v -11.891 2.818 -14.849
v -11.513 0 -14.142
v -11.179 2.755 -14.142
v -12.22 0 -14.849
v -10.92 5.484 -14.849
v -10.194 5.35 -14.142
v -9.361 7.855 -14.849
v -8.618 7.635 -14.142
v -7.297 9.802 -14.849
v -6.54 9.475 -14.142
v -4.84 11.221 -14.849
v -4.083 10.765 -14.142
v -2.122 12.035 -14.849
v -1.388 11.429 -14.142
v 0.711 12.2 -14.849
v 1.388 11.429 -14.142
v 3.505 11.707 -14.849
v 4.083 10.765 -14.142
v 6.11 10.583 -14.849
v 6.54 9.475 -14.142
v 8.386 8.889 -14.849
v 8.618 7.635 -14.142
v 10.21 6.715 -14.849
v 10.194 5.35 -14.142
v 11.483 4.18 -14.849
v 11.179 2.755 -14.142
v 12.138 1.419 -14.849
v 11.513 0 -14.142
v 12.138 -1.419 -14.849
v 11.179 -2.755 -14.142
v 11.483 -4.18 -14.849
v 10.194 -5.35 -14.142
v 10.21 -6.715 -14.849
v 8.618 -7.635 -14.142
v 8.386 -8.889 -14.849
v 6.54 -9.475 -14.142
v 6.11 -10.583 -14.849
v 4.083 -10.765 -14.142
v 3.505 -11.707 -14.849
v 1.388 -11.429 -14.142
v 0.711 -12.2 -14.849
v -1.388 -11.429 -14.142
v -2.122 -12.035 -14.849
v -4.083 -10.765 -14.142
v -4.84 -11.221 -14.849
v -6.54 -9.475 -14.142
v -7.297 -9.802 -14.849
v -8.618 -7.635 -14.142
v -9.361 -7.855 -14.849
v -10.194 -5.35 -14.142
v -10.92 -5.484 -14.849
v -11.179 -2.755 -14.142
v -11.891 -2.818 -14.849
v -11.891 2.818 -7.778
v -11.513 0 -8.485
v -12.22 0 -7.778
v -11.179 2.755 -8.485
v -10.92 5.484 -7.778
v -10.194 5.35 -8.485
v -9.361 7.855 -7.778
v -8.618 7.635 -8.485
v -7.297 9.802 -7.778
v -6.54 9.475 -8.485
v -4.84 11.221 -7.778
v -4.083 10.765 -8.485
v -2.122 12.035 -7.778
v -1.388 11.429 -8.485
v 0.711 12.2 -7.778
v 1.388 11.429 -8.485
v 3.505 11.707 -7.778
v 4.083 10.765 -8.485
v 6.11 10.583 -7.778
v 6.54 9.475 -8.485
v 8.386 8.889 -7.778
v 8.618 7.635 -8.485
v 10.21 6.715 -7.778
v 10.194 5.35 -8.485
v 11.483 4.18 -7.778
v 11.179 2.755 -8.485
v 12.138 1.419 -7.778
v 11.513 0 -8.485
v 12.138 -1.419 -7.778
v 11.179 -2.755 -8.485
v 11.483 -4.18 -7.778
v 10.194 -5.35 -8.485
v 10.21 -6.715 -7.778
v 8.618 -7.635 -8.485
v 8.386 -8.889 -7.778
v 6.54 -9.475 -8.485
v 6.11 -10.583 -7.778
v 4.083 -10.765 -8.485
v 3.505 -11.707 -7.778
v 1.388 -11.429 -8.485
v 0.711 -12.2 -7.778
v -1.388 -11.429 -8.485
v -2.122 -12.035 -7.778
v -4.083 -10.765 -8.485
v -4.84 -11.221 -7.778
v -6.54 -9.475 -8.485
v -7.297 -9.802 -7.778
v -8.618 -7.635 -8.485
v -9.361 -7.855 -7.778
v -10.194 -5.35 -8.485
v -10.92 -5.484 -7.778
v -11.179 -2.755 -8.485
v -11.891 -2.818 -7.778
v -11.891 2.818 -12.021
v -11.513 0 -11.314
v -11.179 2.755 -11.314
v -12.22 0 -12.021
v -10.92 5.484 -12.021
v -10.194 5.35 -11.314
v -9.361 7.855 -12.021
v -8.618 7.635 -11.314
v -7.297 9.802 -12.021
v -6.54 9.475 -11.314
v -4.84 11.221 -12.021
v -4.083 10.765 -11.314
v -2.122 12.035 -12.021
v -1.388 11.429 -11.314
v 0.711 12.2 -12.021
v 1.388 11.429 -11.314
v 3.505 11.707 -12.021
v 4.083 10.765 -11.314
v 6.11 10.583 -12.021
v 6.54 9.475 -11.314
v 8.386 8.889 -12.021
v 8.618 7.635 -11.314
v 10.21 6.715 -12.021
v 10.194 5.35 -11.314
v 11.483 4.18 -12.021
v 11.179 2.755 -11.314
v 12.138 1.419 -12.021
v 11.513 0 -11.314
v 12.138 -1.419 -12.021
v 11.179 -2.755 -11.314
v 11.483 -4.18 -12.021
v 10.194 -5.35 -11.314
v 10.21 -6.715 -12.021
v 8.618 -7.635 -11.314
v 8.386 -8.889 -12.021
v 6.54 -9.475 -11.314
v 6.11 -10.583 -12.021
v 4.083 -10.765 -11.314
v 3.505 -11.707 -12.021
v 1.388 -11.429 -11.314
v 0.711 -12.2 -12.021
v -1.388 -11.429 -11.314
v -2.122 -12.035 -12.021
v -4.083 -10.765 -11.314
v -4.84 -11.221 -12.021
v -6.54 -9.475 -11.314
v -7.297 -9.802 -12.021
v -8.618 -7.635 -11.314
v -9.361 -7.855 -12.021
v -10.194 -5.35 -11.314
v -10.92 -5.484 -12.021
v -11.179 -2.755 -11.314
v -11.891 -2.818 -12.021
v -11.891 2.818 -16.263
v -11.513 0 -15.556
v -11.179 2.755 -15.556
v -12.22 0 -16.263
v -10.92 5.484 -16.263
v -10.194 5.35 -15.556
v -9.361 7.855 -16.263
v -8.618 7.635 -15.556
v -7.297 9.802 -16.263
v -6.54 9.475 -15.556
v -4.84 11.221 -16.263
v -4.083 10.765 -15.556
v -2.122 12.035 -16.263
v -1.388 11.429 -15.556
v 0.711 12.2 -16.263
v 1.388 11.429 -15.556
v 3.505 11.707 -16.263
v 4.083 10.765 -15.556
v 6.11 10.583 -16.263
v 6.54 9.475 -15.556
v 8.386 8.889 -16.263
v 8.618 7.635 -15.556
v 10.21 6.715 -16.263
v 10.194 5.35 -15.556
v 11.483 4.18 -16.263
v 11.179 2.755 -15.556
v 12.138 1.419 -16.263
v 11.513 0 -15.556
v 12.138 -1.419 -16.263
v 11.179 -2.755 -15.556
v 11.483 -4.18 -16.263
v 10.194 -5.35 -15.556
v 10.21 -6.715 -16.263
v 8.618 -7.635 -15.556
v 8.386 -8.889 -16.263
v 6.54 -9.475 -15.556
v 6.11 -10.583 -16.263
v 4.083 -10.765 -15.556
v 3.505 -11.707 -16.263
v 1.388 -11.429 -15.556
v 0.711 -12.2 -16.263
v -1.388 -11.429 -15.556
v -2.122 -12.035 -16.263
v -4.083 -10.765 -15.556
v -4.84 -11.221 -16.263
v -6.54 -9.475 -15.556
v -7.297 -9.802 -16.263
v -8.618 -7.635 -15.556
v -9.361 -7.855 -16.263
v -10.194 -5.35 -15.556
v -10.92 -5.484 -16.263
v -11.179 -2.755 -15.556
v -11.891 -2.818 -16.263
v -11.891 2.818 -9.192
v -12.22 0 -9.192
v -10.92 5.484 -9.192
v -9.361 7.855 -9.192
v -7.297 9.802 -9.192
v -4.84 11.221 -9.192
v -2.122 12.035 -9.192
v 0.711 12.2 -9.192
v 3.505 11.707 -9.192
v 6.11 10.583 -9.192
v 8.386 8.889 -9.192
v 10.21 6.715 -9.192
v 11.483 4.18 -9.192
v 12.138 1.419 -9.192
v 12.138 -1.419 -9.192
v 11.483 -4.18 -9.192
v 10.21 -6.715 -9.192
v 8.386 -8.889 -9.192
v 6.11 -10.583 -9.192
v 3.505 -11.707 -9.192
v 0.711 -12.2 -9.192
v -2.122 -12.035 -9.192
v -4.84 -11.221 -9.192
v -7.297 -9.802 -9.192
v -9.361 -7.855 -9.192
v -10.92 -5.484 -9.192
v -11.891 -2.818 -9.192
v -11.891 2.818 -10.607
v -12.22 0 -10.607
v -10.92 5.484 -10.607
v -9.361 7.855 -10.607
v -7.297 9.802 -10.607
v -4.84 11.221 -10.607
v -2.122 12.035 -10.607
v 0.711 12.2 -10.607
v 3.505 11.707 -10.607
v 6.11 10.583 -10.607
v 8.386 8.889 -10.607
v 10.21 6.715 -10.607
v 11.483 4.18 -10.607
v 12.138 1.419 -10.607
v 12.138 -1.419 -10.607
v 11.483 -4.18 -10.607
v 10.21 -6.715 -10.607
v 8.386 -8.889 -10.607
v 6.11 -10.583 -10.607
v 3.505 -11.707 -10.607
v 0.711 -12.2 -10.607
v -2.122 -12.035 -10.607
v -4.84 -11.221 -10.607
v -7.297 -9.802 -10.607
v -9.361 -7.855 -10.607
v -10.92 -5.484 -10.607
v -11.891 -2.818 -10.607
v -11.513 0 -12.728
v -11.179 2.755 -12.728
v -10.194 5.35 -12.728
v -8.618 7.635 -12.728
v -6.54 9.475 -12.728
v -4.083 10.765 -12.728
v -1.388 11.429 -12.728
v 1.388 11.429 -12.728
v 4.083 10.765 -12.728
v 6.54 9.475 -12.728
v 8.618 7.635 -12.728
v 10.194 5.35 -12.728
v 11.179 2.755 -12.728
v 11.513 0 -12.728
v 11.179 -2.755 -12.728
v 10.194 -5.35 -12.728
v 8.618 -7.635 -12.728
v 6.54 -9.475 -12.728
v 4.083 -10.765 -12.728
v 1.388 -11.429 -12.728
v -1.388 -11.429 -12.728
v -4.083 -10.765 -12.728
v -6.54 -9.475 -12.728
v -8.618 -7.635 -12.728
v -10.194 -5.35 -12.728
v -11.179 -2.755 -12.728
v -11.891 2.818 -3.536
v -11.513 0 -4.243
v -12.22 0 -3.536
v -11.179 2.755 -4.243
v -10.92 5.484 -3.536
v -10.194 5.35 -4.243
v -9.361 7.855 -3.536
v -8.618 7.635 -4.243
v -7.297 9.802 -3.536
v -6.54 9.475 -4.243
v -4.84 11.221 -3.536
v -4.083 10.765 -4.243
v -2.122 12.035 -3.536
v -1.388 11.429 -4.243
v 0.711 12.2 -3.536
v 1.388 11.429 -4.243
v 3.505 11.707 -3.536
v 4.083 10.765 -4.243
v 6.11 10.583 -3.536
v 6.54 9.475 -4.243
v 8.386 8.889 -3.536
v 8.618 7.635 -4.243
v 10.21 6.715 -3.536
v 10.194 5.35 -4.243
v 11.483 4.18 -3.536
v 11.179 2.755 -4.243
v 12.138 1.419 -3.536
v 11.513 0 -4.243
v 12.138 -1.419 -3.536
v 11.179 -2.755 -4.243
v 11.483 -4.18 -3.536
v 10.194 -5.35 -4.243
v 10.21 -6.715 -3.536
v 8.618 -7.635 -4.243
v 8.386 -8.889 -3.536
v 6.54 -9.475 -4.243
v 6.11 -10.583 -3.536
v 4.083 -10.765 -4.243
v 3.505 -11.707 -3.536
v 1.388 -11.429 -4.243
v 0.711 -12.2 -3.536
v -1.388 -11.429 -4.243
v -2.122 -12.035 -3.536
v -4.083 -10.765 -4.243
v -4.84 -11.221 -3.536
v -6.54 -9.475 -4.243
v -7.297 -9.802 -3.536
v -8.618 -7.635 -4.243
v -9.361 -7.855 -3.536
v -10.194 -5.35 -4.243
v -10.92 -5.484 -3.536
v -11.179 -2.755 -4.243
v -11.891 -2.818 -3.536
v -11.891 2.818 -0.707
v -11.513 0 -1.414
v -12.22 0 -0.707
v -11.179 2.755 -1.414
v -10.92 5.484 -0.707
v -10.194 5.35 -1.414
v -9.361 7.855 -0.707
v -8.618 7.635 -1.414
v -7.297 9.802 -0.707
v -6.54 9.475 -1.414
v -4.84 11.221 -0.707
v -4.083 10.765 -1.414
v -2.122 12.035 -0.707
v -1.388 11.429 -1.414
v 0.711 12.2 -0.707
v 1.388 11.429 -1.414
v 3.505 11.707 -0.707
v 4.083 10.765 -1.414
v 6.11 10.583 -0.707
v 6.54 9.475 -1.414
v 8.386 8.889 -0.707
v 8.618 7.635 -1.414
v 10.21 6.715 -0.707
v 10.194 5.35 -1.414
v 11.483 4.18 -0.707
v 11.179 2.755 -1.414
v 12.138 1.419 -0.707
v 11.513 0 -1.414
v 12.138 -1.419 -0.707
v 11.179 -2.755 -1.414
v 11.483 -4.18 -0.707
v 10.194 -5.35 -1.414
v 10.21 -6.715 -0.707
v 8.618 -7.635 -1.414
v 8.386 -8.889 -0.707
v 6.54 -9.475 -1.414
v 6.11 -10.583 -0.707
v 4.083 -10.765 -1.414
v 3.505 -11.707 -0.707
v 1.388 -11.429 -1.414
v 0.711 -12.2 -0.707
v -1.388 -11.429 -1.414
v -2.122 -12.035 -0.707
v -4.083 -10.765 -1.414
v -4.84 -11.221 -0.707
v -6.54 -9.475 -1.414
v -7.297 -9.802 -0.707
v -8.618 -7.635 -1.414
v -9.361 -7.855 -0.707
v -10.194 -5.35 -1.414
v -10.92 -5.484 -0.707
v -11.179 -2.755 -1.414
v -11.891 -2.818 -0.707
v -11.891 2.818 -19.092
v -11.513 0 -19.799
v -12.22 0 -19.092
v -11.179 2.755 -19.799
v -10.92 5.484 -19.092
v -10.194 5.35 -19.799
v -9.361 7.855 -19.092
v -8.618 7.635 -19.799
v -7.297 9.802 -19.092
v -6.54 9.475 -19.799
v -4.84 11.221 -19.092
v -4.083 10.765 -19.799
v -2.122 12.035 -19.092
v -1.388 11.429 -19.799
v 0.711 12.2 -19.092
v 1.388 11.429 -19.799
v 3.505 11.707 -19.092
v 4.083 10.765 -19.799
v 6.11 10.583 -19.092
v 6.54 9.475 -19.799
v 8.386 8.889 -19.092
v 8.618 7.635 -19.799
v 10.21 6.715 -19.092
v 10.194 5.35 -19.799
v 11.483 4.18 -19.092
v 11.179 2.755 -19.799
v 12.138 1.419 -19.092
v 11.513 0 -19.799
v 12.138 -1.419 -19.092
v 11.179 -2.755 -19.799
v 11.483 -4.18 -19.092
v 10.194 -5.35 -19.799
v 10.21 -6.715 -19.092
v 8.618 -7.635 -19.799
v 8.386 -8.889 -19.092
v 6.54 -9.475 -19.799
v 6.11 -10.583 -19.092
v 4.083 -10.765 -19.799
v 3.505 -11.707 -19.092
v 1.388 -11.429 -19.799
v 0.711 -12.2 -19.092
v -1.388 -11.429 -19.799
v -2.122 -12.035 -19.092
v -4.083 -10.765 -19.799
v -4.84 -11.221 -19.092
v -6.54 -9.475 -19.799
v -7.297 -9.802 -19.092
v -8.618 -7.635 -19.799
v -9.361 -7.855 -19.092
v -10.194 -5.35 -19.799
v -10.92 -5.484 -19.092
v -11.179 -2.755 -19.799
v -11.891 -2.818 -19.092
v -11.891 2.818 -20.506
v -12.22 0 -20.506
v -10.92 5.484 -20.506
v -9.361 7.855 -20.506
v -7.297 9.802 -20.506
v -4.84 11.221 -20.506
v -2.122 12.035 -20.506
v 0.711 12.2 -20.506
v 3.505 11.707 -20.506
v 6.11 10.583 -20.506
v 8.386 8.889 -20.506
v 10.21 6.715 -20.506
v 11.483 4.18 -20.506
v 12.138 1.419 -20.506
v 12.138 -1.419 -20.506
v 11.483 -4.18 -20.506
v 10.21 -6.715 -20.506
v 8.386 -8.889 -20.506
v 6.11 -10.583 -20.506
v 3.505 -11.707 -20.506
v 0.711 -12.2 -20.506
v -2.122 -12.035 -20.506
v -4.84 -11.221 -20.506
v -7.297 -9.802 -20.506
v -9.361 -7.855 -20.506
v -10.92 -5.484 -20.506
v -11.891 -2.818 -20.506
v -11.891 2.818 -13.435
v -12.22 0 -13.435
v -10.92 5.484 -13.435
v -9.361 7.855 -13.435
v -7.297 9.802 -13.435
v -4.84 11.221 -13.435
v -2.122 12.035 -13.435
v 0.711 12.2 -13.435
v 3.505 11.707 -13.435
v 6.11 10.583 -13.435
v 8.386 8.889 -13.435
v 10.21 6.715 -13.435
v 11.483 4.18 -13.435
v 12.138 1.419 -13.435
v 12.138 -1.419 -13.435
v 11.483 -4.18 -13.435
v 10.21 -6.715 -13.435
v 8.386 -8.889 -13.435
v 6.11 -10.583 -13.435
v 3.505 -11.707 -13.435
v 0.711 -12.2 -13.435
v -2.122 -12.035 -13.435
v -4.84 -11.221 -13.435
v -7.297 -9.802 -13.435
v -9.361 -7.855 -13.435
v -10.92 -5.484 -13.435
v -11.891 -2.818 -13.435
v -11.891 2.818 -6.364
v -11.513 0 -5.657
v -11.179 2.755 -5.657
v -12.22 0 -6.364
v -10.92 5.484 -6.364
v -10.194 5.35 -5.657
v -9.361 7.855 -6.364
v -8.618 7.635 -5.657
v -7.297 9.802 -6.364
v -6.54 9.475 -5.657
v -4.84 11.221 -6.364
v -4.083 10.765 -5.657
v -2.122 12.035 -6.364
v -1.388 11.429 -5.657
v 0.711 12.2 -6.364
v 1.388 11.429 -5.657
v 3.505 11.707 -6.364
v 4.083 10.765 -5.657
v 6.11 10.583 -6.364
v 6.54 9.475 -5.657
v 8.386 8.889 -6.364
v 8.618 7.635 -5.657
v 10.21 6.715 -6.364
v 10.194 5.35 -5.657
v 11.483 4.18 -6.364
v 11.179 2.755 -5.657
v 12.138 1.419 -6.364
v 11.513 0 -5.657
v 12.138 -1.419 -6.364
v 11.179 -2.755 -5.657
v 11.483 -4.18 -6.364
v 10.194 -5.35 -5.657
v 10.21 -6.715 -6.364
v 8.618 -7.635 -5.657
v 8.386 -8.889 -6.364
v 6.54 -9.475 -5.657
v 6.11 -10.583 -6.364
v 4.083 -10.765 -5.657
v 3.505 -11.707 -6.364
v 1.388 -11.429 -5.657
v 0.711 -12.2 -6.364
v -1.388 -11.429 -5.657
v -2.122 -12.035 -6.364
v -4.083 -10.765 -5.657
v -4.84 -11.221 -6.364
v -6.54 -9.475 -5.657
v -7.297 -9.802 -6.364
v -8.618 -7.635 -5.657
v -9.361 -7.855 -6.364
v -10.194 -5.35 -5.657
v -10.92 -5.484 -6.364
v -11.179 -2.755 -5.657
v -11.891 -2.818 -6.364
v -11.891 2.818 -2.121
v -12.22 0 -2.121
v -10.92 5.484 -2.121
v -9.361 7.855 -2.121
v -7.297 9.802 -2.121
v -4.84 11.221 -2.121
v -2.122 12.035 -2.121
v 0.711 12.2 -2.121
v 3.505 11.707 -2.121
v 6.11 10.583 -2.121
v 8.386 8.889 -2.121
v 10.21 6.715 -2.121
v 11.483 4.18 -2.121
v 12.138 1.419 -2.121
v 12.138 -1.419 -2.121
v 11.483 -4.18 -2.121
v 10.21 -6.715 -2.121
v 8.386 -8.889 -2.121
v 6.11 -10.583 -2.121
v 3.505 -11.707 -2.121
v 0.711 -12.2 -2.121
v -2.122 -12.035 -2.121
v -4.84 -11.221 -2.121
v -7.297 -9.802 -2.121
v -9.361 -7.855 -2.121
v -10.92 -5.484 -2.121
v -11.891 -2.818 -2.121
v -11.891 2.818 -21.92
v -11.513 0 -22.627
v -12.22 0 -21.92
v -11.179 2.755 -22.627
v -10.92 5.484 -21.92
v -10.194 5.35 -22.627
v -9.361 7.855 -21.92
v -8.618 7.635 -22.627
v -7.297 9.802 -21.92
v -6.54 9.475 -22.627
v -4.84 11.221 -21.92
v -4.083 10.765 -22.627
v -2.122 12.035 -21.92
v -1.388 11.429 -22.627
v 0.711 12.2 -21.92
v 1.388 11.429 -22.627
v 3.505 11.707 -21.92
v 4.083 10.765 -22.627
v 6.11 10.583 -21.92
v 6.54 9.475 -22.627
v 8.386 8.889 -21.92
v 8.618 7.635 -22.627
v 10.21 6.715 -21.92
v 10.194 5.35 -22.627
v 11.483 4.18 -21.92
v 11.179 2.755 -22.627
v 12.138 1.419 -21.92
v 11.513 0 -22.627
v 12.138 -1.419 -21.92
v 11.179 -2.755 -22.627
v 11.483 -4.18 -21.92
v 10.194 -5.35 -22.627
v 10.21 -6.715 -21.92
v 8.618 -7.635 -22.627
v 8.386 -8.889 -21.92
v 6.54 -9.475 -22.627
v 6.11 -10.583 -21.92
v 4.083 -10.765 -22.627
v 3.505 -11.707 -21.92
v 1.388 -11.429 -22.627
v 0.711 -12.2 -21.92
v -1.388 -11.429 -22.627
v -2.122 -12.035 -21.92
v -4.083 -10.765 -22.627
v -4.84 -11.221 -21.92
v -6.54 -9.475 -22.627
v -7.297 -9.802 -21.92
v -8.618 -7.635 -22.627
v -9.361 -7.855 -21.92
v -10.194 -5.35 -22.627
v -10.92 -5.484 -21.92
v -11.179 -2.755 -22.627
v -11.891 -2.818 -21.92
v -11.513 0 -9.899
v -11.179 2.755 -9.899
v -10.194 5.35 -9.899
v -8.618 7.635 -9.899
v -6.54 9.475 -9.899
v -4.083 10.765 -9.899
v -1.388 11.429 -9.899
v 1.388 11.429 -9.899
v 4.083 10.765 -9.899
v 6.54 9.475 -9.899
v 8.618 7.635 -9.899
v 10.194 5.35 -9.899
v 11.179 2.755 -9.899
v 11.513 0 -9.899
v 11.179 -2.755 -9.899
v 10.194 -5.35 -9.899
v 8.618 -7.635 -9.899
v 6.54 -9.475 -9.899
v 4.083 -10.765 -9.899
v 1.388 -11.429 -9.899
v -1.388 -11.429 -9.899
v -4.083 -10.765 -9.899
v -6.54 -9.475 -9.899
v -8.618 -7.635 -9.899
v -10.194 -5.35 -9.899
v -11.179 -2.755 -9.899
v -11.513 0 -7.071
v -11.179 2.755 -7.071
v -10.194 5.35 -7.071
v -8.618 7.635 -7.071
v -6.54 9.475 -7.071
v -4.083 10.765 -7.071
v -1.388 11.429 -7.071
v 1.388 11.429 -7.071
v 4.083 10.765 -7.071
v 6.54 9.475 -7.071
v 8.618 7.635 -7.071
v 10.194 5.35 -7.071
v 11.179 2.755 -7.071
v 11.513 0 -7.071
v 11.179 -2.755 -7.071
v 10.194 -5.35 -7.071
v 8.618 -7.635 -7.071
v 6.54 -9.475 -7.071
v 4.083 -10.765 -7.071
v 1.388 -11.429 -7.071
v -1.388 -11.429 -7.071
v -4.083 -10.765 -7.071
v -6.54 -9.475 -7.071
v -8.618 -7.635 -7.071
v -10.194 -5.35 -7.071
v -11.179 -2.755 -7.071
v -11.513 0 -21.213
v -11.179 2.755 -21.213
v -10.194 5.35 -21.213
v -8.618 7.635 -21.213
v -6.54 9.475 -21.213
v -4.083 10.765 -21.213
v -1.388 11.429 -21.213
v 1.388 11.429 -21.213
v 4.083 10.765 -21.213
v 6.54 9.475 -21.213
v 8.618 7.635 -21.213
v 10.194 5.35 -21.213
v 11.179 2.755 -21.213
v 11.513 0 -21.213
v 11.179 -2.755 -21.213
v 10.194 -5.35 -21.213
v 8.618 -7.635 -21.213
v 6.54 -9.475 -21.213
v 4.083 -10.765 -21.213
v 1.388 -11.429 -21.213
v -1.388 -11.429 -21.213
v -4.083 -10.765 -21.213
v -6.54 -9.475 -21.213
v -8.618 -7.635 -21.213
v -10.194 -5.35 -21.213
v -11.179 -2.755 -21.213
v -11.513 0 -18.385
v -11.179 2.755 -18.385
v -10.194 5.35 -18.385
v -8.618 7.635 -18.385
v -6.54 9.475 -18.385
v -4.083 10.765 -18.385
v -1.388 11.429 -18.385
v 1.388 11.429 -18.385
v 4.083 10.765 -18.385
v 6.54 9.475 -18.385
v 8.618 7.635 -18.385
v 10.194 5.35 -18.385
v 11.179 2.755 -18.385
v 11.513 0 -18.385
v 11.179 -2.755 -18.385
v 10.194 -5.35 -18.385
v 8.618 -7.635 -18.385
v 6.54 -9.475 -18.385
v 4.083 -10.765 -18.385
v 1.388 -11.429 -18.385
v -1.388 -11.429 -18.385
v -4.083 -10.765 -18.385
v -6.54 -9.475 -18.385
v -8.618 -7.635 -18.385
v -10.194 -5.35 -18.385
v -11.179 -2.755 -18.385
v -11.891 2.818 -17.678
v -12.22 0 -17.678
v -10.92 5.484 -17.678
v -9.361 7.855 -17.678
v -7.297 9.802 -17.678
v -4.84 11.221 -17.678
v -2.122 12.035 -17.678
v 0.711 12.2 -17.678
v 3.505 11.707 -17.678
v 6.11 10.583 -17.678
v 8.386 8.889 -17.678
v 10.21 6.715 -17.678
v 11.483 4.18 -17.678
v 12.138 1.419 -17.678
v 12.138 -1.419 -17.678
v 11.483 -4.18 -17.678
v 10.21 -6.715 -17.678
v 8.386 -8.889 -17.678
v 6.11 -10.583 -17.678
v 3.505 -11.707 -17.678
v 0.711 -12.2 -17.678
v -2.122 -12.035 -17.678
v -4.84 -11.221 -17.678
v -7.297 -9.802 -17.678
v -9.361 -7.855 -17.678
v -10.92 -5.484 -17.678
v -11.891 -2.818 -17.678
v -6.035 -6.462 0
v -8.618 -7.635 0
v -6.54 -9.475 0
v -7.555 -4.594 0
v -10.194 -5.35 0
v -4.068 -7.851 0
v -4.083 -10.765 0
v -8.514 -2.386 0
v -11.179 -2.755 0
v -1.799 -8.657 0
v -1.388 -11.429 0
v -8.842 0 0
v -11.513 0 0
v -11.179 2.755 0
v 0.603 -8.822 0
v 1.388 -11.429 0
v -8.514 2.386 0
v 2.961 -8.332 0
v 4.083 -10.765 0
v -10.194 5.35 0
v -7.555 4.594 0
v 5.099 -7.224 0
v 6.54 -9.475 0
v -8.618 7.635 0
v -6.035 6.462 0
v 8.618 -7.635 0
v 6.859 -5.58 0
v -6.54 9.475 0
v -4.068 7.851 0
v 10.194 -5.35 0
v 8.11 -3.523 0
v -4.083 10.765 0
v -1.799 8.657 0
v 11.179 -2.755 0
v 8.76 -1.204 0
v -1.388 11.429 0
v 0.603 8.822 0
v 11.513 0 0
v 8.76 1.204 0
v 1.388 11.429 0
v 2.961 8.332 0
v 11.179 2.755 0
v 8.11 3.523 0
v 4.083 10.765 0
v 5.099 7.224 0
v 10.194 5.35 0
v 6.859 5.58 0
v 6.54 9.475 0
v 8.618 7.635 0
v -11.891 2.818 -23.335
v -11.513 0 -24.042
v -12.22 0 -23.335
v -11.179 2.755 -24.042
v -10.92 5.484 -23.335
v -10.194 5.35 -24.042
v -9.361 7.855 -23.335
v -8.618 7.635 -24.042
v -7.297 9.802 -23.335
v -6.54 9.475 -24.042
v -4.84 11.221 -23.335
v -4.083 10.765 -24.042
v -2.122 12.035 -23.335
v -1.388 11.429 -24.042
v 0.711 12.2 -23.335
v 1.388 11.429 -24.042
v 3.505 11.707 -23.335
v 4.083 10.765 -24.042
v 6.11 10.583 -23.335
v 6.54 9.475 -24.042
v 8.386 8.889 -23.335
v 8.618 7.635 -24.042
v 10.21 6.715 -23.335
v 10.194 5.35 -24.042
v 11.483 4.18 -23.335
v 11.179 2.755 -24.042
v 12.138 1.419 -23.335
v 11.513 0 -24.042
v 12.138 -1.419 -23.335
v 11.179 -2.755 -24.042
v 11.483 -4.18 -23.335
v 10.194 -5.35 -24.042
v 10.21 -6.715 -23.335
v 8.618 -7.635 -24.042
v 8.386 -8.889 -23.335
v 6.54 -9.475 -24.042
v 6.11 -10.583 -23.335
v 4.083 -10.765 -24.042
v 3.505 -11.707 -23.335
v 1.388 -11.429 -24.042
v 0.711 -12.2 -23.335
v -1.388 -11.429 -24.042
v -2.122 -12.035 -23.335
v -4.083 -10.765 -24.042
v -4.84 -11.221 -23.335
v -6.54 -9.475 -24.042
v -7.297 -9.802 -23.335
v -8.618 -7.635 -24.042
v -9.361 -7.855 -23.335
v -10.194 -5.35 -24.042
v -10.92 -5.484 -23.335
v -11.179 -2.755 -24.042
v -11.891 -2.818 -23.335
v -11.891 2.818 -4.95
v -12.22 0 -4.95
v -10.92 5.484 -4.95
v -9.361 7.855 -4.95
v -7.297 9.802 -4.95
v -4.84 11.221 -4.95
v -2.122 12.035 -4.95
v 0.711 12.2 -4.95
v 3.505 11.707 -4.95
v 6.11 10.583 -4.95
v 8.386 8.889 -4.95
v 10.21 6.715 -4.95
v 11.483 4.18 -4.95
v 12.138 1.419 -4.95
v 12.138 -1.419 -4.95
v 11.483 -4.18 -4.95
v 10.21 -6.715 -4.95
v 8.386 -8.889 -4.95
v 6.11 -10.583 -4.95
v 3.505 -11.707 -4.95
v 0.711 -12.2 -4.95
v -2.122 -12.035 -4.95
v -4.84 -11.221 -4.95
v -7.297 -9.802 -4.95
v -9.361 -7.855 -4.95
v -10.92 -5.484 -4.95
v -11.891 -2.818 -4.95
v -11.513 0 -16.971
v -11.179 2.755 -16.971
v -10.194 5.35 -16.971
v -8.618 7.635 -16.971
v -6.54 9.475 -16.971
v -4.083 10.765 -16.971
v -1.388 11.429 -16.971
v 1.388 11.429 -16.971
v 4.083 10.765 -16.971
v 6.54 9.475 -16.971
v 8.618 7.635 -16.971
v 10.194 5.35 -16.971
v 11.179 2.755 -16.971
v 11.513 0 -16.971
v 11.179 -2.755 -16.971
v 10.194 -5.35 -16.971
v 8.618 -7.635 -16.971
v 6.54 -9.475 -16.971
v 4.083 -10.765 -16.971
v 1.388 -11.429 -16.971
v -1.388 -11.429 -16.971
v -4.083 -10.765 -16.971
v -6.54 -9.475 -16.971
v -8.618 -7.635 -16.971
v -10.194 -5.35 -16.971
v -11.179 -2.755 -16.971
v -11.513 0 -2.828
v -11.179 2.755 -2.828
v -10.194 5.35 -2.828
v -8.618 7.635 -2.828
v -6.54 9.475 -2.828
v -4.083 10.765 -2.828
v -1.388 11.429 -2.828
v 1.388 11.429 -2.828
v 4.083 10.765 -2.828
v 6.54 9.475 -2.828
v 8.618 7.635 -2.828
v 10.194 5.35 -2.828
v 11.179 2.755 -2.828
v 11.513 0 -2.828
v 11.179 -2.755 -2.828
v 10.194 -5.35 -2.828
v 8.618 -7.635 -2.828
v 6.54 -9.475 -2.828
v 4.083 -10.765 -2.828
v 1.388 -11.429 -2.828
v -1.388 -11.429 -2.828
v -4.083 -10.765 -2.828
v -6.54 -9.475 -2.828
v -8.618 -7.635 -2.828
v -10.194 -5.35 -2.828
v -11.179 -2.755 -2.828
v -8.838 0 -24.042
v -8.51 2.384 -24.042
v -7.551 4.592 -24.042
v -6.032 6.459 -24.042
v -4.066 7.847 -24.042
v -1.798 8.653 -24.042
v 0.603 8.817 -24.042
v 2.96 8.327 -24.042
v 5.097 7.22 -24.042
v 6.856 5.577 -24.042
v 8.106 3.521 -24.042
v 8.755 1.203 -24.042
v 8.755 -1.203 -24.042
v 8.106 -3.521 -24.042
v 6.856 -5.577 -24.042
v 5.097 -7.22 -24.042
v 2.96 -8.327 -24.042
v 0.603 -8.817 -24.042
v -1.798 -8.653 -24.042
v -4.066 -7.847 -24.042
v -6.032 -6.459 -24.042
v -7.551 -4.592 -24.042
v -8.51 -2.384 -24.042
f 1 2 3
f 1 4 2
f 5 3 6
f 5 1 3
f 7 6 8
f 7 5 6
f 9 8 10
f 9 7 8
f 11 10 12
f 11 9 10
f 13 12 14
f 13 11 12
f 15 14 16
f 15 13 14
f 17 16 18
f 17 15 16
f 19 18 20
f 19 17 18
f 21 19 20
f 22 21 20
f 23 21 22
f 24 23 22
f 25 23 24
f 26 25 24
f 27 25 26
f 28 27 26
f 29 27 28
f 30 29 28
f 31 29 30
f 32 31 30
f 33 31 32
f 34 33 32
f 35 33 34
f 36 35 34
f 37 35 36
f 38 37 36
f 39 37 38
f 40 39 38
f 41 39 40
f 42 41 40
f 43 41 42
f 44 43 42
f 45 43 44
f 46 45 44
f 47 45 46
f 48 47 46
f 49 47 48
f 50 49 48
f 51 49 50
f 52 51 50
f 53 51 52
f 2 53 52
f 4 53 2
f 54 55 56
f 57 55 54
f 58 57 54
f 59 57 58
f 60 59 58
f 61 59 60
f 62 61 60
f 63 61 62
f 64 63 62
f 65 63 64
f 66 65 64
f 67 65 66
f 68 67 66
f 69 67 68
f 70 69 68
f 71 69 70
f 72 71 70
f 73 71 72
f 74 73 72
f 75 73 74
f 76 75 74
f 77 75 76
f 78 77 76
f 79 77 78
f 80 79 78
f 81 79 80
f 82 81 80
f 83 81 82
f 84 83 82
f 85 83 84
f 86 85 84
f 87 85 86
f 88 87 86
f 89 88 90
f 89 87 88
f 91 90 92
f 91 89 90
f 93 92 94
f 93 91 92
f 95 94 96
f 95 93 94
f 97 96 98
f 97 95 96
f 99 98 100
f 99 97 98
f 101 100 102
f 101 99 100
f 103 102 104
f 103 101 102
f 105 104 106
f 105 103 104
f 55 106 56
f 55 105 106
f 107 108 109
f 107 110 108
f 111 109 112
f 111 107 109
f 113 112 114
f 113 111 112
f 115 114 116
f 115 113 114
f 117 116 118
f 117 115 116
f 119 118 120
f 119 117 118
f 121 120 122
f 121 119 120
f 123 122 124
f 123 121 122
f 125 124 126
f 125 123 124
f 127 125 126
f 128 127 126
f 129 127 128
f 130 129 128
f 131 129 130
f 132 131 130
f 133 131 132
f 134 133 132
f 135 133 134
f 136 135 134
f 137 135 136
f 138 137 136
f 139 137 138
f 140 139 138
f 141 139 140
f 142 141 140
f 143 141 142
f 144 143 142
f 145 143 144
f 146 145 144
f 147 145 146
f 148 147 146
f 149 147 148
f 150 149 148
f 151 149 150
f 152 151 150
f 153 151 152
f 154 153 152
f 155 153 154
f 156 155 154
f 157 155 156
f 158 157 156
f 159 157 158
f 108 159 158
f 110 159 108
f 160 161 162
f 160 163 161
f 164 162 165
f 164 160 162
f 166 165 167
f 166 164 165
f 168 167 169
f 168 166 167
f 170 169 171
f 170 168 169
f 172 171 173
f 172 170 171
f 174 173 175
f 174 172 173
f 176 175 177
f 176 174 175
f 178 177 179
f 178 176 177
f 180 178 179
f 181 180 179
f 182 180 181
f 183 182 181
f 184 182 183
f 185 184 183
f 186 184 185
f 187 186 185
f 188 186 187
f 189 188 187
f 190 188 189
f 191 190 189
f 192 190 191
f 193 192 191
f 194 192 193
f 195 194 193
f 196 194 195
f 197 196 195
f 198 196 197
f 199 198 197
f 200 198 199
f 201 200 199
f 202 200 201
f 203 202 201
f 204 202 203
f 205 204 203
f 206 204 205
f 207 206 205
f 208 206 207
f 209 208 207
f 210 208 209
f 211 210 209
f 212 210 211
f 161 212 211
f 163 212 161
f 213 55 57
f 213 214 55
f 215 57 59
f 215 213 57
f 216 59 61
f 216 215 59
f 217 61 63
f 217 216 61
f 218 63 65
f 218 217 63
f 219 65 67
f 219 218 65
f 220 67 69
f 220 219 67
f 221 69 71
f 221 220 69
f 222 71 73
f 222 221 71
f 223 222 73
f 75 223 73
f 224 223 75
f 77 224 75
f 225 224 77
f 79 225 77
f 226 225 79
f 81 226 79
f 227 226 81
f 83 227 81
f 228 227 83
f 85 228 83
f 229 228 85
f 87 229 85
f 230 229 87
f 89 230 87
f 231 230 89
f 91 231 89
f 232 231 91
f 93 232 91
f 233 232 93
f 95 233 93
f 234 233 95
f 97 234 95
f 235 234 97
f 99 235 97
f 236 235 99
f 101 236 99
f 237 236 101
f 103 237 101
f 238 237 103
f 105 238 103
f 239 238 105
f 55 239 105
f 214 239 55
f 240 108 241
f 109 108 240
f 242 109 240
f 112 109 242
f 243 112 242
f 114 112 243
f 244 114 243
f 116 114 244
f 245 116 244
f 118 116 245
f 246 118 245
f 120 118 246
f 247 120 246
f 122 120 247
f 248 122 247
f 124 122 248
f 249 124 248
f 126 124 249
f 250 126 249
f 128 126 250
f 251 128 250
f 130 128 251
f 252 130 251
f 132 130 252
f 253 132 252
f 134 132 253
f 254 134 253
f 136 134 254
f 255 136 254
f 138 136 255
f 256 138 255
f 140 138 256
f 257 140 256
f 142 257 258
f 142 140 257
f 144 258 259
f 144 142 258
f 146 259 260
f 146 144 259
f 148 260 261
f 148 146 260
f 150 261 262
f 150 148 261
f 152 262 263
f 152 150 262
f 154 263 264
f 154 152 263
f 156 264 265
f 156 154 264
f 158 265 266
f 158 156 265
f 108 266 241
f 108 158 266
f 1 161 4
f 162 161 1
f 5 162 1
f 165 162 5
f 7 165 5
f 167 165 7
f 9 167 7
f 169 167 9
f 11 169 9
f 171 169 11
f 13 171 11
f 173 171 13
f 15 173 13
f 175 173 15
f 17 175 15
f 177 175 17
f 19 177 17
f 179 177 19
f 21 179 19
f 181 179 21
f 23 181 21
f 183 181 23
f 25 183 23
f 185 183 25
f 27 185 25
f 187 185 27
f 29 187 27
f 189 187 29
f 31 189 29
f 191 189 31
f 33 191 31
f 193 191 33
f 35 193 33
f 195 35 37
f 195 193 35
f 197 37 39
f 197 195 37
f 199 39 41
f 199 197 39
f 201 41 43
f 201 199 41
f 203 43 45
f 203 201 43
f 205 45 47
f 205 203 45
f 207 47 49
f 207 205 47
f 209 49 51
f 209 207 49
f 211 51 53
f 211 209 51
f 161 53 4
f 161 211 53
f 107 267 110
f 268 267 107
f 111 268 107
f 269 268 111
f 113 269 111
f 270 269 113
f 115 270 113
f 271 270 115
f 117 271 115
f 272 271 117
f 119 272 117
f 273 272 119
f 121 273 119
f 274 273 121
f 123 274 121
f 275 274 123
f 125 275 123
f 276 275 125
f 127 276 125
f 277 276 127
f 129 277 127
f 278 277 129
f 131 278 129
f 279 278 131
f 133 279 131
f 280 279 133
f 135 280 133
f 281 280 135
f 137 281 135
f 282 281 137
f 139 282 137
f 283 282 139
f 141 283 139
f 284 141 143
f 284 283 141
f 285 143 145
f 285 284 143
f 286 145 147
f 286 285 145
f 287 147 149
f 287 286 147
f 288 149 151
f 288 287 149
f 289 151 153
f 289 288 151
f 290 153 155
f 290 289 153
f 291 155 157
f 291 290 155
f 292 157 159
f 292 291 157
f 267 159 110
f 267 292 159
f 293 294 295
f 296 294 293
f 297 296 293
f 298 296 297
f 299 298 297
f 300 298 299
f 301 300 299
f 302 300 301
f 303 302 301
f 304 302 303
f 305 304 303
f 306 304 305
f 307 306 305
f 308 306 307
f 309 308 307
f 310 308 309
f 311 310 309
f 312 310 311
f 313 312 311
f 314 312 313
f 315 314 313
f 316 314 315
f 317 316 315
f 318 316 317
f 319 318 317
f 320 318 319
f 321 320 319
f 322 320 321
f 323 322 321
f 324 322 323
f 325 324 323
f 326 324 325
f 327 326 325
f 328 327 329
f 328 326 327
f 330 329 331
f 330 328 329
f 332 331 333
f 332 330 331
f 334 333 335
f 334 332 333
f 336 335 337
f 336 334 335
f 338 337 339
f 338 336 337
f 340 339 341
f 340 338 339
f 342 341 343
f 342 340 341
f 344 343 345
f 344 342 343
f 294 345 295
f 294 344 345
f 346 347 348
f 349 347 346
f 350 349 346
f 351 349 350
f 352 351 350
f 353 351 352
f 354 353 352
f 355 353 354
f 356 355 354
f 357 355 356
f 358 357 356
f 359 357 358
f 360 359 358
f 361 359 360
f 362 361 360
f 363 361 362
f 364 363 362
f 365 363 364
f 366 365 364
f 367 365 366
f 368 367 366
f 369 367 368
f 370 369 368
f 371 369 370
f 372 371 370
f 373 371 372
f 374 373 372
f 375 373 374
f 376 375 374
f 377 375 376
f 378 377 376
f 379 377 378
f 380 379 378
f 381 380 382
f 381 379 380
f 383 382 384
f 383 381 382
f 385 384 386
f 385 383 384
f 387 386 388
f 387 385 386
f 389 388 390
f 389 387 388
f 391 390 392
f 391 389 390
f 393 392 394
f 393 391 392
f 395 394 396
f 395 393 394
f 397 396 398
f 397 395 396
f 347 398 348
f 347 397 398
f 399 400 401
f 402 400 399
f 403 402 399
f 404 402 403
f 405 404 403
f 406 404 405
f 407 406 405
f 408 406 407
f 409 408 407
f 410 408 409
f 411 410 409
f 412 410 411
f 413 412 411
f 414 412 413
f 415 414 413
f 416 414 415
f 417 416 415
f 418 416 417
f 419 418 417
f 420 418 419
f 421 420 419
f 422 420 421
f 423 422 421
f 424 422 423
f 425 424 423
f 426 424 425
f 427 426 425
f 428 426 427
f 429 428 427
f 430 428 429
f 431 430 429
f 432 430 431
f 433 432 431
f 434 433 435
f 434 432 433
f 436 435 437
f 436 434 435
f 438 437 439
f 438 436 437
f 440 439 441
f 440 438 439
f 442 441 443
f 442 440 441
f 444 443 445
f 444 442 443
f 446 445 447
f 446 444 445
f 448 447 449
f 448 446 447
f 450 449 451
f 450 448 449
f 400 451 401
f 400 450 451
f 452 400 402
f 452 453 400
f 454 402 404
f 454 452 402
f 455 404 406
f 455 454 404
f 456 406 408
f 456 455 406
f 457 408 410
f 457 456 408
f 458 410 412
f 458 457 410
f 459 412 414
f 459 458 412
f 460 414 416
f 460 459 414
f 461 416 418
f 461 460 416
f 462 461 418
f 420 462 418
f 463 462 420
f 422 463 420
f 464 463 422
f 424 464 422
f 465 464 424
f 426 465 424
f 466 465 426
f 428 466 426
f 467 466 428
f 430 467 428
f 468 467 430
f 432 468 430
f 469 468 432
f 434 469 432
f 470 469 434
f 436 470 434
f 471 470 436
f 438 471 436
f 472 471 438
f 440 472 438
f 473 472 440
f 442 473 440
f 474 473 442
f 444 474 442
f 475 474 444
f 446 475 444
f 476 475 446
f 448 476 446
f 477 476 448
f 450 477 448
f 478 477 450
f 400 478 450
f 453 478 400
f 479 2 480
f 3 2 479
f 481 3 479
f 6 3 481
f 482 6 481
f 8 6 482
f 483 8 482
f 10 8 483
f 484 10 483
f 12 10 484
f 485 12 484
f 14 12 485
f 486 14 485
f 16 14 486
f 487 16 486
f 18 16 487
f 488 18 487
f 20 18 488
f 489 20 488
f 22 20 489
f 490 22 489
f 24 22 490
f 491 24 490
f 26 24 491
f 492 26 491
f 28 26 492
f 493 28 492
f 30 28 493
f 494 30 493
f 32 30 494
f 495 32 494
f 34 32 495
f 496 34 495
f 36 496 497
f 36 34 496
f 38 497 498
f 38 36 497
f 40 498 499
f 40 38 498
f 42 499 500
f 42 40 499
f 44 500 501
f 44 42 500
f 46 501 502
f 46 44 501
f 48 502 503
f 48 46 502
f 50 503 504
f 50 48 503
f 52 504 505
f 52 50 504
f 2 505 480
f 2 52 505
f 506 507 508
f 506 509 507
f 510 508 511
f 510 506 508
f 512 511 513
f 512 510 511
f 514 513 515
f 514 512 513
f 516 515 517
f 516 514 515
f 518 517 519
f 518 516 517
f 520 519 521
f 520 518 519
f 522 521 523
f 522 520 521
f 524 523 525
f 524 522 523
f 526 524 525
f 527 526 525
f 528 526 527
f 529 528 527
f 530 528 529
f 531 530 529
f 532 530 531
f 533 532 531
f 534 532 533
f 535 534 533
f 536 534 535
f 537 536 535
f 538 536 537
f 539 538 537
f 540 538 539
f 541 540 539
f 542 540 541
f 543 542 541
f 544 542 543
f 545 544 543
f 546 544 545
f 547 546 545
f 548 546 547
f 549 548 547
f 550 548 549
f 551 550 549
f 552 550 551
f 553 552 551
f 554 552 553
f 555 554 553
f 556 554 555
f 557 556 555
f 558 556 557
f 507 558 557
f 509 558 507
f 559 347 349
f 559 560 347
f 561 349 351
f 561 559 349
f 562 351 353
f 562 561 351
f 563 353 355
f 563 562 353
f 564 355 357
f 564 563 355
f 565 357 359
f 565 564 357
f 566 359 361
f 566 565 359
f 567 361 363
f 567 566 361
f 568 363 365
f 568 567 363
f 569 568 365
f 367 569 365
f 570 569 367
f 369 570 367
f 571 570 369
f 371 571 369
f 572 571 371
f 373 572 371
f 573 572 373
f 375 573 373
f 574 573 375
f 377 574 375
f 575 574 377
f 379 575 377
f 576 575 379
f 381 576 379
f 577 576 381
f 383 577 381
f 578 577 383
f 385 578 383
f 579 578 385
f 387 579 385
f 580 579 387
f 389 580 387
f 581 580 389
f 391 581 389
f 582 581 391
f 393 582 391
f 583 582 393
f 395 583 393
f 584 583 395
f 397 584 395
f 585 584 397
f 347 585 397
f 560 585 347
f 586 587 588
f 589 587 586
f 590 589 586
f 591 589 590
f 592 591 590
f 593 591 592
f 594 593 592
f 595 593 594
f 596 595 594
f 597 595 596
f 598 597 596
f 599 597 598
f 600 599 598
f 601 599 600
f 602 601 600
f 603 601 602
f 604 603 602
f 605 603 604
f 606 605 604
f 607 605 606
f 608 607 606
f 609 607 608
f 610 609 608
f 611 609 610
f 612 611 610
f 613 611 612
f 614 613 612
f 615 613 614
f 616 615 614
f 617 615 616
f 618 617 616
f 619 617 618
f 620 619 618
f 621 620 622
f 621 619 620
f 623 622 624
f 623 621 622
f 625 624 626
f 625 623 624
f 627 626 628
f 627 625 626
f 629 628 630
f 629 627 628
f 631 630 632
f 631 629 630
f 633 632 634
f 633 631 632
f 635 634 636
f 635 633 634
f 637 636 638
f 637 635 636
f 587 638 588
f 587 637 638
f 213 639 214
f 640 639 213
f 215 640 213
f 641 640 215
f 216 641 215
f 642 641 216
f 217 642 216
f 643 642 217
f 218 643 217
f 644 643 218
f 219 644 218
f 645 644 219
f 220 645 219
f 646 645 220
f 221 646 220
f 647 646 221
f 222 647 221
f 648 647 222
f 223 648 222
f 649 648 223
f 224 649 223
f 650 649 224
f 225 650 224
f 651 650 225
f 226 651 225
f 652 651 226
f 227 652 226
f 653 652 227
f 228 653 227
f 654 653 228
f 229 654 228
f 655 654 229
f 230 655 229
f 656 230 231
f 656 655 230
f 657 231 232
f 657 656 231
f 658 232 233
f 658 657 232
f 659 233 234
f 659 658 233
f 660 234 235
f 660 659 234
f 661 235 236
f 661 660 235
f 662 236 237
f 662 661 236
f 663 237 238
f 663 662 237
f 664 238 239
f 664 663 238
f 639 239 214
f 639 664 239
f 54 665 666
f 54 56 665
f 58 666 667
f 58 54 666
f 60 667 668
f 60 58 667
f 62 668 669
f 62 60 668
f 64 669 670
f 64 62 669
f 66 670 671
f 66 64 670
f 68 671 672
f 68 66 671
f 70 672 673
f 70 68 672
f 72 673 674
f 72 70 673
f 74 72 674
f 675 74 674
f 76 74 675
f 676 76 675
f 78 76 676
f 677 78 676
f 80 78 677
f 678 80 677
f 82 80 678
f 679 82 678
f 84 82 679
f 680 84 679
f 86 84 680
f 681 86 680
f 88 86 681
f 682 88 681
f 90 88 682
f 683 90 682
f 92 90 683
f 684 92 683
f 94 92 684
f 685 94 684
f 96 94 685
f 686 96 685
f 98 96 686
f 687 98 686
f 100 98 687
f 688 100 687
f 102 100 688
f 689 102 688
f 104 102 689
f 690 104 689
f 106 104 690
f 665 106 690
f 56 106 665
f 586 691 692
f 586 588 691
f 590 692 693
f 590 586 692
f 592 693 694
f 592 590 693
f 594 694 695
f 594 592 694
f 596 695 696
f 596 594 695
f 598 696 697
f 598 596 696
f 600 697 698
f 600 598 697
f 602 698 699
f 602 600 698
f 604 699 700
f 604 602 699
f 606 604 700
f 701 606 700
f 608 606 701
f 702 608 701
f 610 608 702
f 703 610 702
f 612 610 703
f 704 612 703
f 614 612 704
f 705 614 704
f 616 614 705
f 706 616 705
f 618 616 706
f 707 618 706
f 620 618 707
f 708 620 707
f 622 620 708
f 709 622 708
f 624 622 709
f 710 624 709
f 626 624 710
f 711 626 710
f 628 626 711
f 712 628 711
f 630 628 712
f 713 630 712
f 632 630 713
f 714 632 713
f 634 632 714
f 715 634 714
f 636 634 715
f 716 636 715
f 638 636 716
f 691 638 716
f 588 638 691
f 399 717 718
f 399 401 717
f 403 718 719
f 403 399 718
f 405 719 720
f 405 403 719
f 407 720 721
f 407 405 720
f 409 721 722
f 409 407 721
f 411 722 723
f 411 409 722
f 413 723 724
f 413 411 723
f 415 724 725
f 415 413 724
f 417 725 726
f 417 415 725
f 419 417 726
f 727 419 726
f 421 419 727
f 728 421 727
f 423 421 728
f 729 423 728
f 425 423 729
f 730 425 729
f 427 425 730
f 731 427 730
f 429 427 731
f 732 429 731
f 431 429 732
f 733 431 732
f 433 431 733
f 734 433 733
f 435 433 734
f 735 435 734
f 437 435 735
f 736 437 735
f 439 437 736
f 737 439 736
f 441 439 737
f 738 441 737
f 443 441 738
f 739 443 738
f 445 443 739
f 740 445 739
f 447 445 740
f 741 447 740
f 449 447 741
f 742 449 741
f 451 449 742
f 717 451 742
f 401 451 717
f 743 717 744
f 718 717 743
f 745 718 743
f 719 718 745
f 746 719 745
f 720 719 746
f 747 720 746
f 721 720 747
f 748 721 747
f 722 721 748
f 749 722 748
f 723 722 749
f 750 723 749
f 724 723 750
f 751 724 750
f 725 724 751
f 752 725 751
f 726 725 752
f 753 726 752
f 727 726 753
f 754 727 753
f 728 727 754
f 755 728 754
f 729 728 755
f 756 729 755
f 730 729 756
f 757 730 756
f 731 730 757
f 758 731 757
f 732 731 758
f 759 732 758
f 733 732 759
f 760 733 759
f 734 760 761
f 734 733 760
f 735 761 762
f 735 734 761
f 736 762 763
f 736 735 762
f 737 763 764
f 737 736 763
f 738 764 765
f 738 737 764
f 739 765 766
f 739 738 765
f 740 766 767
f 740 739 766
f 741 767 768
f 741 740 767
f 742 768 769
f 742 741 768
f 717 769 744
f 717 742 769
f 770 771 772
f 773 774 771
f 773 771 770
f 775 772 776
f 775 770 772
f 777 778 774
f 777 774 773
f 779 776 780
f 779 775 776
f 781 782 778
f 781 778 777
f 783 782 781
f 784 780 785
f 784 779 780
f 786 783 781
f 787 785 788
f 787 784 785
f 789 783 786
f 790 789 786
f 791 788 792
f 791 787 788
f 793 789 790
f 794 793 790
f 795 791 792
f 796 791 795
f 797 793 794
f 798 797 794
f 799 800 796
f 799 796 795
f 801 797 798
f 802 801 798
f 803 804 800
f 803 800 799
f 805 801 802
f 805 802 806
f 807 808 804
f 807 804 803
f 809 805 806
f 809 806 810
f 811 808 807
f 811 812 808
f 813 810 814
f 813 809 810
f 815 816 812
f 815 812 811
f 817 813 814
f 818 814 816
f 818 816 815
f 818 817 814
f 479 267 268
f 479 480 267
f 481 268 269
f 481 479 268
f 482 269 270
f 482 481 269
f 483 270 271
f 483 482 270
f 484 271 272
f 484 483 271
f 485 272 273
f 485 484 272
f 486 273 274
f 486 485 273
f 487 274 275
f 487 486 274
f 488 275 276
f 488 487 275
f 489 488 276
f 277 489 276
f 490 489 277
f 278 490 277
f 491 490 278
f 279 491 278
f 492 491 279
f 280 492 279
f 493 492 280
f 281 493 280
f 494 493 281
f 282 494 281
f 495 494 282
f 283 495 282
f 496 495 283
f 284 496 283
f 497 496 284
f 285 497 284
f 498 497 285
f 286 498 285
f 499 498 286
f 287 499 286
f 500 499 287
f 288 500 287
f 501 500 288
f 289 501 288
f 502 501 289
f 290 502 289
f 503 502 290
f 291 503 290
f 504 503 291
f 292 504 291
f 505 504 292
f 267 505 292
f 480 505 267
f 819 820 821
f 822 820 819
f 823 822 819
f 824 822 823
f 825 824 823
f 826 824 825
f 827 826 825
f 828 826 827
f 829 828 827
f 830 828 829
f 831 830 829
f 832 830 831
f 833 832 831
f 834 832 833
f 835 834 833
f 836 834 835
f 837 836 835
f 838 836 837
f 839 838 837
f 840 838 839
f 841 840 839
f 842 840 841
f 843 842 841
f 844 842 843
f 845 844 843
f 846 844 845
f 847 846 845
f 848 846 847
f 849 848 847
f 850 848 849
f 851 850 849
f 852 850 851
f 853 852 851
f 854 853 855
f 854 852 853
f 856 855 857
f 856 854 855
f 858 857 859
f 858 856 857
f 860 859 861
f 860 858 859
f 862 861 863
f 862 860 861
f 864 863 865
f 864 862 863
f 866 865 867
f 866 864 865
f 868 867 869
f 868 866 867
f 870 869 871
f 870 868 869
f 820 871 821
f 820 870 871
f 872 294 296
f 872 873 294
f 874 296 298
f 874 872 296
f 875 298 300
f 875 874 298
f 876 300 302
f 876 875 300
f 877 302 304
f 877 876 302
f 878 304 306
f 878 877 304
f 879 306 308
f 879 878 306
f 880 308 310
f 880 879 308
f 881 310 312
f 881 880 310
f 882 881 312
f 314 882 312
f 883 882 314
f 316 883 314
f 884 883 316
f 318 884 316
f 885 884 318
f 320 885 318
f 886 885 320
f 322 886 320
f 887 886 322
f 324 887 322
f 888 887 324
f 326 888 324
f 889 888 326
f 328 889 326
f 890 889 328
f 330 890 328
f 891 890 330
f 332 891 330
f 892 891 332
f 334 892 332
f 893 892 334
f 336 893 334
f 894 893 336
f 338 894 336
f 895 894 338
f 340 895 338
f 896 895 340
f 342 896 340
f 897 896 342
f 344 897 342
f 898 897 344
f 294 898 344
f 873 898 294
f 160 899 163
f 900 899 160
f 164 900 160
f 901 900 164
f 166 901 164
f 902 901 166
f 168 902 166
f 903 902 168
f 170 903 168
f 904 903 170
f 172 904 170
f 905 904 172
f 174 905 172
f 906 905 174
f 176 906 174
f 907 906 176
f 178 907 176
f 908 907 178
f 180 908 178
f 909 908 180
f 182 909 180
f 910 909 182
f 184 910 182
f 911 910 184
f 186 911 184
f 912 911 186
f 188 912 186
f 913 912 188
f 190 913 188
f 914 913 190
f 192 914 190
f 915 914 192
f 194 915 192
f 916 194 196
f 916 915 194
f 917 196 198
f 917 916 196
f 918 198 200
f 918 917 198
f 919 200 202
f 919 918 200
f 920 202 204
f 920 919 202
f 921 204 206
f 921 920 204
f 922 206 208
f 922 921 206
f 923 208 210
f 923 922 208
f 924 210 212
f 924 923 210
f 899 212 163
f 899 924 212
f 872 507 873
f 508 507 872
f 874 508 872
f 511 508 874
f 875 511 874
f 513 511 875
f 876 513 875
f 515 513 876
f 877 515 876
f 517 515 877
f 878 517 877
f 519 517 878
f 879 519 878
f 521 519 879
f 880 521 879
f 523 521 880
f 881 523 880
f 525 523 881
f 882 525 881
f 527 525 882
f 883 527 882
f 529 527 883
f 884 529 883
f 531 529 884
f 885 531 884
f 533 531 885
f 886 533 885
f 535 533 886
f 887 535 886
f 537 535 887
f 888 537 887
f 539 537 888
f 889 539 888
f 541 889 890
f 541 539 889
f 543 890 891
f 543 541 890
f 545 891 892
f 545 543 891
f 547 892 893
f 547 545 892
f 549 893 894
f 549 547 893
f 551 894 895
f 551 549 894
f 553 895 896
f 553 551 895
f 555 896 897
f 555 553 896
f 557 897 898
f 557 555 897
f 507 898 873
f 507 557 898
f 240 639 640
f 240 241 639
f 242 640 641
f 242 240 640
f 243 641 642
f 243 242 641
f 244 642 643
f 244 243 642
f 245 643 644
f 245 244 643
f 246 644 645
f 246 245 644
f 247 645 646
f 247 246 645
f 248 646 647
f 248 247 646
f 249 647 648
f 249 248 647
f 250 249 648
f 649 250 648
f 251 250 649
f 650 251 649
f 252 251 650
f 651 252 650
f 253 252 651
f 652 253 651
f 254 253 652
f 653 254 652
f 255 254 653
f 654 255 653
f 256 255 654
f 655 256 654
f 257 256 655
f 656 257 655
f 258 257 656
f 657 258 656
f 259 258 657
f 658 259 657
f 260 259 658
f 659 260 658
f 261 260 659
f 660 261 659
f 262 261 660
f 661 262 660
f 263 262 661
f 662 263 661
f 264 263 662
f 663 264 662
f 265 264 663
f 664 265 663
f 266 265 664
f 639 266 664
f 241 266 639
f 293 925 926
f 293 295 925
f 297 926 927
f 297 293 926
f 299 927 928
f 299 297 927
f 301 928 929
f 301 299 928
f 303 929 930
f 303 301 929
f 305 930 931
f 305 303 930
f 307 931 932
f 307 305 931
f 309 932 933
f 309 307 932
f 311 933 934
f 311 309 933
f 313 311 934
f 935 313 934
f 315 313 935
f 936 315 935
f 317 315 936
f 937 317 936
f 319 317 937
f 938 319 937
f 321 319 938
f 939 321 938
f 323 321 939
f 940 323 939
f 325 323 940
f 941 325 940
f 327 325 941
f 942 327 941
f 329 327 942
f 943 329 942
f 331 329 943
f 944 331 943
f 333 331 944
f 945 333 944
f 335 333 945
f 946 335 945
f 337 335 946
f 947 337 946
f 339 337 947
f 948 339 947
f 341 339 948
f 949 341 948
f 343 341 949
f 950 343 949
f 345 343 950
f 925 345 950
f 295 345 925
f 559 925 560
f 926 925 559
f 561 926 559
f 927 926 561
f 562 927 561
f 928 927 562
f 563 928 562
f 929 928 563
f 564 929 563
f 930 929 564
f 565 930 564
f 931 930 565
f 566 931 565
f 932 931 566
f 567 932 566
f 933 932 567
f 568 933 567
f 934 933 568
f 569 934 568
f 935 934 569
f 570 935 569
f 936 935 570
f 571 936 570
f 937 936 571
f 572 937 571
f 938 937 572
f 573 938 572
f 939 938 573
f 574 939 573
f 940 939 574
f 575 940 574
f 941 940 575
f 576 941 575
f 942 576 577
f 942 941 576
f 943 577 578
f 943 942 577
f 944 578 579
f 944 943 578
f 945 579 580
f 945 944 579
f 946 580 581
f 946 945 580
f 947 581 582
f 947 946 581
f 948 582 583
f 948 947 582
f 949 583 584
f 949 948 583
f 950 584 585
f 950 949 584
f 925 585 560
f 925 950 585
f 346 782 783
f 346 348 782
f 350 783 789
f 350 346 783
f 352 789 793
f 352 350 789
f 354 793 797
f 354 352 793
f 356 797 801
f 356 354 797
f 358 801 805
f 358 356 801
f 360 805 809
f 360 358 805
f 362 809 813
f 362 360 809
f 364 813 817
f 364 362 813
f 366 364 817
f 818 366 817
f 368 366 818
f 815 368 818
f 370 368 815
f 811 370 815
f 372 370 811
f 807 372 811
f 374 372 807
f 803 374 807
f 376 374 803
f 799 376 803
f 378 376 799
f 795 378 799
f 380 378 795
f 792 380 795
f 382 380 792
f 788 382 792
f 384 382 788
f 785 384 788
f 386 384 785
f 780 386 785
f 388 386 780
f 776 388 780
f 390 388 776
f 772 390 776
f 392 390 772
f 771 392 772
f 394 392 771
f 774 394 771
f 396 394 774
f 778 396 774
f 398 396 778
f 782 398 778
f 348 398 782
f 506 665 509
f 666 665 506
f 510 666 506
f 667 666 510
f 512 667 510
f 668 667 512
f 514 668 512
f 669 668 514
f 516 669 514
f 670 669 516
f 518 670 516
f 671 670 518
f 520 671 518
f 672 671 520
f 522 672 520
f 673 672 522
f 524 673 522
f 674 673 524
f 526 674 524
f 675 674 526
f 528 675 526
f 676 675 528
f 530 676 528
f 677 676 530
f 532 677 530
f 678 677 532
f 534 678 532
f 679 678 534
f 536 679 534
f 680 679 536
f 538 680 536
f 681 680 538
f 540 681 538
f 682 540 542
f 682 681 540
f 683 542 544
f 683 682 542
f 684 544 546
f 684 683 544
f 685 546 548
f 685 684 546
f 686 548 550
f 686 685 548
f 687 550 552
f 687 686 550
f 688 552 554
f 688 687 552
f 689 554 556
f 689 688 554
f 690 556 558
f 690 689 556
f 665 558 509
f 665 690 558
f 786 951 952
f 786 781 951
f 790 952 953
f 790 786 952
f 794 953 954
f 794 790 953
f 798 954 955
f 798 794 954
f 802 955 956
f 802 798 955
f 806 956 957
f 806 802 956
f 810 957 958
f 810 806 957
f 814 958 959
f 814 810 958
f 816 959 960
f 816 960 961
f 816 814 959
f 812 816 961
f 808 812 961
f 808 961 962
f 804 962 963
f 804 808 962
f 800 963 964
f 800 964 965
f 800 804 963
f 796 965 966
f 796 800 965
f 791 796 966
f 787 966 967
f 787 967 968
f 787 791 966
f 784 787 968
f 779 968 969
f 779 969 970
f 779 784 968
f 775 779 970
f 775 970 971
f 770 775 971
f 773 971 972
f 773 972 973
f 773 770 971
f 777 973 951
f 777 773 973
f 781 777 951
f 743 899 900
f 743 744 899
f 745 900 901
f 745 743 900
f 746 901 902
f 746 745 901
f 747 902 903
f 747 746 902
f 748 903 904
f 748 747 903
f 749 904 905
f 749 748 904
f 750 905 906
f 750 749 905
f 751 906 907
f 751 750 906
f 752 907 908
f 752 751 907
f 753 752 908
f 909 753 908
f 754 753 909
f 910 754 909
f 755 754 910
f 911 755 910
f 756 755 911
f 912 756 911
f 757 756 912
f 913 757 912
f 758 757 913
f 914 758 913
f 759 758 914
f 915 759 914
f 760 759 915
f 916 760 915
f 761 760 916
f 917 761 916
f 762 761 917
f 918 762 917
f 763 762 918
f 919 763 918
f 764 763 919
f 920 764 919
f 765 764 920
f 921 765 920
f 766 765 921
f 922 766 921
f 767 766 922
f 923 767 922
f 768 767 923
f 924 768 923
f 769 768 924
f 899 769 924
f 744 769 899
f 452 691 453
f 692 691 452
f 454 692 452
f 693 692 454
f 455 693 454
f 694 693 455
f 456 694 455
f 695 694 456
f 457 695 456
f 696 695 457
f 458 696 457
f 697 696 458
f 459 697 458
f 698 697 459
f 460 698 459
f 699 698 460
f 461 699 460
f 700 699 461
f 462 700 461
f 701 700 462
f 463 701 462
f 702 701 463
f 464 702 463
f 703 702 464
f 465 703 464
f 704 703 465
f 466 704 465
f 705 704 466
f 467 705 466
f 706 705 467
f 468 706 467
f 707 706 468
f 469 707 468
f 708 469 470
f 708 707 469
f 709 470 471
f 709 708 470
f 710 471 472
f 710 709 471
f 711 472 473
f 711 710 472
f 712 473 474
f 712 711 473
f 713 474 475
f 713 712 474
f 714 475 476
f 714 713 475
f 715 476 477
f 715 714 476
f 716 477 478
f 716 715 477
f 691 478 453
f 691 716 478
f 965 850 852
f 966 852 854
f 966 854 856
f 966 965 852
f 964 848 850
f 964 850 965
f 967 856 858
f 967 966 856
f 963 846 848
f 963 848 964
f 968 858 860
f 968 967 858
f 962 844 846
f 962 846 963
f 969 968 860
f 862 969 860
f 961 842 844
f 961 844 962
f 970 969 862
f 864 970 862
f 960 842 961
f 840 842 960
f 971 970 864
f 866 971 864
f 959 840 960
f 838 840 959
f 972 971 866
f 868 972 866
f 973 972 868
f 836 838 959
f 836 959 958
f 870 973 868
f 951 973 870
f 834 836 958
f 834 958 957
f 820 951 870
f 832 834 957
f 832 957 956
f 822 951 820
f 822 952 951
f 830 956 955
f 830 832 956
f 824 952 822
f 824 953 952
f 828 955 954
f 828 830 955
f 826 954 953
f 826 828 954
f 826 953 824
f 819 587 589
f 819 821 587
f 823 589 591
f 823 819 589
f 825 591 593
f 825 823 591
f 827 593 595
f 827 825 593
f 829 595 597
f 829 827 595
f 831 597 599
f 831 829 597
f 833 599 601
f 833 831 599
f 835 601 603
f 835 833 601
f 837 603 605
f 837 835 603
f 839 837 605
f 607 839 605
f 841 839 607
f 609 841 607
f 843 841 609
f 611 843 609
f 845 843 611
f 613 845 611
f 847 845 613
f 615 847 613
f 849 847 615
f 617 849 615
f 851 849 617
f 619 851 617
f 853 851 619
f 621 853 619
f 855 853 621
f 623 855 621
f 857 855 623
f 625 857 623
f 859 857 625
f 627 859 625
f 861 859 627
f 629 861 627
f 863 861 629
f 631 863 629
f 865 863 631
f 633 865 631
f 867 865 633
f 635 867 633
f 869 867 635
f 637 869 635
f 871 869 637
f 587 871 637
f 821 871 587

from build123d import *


with BuildPart() as f1:
    # F0 (on Front) → F1 (revolve)
    with BuildSketch(Plane.XZ):
        Polygon((-8.837755, -24.041631), (-8.84216, 0), (-11.513228, 0), (-12.220335, -0.707107), (-11.513228, -1.414214), (-12.220335, -2.12132), (-11.513228, -2.828427), (-12.220335, -3.535534), (-11.513228, -4.242641), (-12.220335, -4.949747), (-11.513228, -5.656854), (-12.220335, -6.363961), (-11.513228, -7.071068), (-12.220335, -7.778175), (-11.513228, -8.485281), (-12.220335, -9.192388), (-11.513228, -9.899495), (-12.220335, -10.606602), (-11.513228, -11.313708), (-12.220335, -12.020815), (-11.513228, -12.727922), (-12.220335, -13.435029), (-11.513228, -14.142136), (-12.220335, -14.849242), (-11.513228, -15.556349), (-12.220335, -16.263456), (-11.513228, -16.970563), (-12.220335, -17.67767), (-11.513228, -18.384776), (-12.220335, -19.091883), (-11.513228, -19.79899), (-12.220335, -20.506097), (-11.513228, -21.213203), (-12.220335, -21.92031), (-11.513228, -22.627417), (-12.220335, -23.334524), (-11.513228, -24.041631), align=None)
    revolve(axis=Axis((0, 0, -9.983526), (0, 0, -1)))


solid = f1.part
